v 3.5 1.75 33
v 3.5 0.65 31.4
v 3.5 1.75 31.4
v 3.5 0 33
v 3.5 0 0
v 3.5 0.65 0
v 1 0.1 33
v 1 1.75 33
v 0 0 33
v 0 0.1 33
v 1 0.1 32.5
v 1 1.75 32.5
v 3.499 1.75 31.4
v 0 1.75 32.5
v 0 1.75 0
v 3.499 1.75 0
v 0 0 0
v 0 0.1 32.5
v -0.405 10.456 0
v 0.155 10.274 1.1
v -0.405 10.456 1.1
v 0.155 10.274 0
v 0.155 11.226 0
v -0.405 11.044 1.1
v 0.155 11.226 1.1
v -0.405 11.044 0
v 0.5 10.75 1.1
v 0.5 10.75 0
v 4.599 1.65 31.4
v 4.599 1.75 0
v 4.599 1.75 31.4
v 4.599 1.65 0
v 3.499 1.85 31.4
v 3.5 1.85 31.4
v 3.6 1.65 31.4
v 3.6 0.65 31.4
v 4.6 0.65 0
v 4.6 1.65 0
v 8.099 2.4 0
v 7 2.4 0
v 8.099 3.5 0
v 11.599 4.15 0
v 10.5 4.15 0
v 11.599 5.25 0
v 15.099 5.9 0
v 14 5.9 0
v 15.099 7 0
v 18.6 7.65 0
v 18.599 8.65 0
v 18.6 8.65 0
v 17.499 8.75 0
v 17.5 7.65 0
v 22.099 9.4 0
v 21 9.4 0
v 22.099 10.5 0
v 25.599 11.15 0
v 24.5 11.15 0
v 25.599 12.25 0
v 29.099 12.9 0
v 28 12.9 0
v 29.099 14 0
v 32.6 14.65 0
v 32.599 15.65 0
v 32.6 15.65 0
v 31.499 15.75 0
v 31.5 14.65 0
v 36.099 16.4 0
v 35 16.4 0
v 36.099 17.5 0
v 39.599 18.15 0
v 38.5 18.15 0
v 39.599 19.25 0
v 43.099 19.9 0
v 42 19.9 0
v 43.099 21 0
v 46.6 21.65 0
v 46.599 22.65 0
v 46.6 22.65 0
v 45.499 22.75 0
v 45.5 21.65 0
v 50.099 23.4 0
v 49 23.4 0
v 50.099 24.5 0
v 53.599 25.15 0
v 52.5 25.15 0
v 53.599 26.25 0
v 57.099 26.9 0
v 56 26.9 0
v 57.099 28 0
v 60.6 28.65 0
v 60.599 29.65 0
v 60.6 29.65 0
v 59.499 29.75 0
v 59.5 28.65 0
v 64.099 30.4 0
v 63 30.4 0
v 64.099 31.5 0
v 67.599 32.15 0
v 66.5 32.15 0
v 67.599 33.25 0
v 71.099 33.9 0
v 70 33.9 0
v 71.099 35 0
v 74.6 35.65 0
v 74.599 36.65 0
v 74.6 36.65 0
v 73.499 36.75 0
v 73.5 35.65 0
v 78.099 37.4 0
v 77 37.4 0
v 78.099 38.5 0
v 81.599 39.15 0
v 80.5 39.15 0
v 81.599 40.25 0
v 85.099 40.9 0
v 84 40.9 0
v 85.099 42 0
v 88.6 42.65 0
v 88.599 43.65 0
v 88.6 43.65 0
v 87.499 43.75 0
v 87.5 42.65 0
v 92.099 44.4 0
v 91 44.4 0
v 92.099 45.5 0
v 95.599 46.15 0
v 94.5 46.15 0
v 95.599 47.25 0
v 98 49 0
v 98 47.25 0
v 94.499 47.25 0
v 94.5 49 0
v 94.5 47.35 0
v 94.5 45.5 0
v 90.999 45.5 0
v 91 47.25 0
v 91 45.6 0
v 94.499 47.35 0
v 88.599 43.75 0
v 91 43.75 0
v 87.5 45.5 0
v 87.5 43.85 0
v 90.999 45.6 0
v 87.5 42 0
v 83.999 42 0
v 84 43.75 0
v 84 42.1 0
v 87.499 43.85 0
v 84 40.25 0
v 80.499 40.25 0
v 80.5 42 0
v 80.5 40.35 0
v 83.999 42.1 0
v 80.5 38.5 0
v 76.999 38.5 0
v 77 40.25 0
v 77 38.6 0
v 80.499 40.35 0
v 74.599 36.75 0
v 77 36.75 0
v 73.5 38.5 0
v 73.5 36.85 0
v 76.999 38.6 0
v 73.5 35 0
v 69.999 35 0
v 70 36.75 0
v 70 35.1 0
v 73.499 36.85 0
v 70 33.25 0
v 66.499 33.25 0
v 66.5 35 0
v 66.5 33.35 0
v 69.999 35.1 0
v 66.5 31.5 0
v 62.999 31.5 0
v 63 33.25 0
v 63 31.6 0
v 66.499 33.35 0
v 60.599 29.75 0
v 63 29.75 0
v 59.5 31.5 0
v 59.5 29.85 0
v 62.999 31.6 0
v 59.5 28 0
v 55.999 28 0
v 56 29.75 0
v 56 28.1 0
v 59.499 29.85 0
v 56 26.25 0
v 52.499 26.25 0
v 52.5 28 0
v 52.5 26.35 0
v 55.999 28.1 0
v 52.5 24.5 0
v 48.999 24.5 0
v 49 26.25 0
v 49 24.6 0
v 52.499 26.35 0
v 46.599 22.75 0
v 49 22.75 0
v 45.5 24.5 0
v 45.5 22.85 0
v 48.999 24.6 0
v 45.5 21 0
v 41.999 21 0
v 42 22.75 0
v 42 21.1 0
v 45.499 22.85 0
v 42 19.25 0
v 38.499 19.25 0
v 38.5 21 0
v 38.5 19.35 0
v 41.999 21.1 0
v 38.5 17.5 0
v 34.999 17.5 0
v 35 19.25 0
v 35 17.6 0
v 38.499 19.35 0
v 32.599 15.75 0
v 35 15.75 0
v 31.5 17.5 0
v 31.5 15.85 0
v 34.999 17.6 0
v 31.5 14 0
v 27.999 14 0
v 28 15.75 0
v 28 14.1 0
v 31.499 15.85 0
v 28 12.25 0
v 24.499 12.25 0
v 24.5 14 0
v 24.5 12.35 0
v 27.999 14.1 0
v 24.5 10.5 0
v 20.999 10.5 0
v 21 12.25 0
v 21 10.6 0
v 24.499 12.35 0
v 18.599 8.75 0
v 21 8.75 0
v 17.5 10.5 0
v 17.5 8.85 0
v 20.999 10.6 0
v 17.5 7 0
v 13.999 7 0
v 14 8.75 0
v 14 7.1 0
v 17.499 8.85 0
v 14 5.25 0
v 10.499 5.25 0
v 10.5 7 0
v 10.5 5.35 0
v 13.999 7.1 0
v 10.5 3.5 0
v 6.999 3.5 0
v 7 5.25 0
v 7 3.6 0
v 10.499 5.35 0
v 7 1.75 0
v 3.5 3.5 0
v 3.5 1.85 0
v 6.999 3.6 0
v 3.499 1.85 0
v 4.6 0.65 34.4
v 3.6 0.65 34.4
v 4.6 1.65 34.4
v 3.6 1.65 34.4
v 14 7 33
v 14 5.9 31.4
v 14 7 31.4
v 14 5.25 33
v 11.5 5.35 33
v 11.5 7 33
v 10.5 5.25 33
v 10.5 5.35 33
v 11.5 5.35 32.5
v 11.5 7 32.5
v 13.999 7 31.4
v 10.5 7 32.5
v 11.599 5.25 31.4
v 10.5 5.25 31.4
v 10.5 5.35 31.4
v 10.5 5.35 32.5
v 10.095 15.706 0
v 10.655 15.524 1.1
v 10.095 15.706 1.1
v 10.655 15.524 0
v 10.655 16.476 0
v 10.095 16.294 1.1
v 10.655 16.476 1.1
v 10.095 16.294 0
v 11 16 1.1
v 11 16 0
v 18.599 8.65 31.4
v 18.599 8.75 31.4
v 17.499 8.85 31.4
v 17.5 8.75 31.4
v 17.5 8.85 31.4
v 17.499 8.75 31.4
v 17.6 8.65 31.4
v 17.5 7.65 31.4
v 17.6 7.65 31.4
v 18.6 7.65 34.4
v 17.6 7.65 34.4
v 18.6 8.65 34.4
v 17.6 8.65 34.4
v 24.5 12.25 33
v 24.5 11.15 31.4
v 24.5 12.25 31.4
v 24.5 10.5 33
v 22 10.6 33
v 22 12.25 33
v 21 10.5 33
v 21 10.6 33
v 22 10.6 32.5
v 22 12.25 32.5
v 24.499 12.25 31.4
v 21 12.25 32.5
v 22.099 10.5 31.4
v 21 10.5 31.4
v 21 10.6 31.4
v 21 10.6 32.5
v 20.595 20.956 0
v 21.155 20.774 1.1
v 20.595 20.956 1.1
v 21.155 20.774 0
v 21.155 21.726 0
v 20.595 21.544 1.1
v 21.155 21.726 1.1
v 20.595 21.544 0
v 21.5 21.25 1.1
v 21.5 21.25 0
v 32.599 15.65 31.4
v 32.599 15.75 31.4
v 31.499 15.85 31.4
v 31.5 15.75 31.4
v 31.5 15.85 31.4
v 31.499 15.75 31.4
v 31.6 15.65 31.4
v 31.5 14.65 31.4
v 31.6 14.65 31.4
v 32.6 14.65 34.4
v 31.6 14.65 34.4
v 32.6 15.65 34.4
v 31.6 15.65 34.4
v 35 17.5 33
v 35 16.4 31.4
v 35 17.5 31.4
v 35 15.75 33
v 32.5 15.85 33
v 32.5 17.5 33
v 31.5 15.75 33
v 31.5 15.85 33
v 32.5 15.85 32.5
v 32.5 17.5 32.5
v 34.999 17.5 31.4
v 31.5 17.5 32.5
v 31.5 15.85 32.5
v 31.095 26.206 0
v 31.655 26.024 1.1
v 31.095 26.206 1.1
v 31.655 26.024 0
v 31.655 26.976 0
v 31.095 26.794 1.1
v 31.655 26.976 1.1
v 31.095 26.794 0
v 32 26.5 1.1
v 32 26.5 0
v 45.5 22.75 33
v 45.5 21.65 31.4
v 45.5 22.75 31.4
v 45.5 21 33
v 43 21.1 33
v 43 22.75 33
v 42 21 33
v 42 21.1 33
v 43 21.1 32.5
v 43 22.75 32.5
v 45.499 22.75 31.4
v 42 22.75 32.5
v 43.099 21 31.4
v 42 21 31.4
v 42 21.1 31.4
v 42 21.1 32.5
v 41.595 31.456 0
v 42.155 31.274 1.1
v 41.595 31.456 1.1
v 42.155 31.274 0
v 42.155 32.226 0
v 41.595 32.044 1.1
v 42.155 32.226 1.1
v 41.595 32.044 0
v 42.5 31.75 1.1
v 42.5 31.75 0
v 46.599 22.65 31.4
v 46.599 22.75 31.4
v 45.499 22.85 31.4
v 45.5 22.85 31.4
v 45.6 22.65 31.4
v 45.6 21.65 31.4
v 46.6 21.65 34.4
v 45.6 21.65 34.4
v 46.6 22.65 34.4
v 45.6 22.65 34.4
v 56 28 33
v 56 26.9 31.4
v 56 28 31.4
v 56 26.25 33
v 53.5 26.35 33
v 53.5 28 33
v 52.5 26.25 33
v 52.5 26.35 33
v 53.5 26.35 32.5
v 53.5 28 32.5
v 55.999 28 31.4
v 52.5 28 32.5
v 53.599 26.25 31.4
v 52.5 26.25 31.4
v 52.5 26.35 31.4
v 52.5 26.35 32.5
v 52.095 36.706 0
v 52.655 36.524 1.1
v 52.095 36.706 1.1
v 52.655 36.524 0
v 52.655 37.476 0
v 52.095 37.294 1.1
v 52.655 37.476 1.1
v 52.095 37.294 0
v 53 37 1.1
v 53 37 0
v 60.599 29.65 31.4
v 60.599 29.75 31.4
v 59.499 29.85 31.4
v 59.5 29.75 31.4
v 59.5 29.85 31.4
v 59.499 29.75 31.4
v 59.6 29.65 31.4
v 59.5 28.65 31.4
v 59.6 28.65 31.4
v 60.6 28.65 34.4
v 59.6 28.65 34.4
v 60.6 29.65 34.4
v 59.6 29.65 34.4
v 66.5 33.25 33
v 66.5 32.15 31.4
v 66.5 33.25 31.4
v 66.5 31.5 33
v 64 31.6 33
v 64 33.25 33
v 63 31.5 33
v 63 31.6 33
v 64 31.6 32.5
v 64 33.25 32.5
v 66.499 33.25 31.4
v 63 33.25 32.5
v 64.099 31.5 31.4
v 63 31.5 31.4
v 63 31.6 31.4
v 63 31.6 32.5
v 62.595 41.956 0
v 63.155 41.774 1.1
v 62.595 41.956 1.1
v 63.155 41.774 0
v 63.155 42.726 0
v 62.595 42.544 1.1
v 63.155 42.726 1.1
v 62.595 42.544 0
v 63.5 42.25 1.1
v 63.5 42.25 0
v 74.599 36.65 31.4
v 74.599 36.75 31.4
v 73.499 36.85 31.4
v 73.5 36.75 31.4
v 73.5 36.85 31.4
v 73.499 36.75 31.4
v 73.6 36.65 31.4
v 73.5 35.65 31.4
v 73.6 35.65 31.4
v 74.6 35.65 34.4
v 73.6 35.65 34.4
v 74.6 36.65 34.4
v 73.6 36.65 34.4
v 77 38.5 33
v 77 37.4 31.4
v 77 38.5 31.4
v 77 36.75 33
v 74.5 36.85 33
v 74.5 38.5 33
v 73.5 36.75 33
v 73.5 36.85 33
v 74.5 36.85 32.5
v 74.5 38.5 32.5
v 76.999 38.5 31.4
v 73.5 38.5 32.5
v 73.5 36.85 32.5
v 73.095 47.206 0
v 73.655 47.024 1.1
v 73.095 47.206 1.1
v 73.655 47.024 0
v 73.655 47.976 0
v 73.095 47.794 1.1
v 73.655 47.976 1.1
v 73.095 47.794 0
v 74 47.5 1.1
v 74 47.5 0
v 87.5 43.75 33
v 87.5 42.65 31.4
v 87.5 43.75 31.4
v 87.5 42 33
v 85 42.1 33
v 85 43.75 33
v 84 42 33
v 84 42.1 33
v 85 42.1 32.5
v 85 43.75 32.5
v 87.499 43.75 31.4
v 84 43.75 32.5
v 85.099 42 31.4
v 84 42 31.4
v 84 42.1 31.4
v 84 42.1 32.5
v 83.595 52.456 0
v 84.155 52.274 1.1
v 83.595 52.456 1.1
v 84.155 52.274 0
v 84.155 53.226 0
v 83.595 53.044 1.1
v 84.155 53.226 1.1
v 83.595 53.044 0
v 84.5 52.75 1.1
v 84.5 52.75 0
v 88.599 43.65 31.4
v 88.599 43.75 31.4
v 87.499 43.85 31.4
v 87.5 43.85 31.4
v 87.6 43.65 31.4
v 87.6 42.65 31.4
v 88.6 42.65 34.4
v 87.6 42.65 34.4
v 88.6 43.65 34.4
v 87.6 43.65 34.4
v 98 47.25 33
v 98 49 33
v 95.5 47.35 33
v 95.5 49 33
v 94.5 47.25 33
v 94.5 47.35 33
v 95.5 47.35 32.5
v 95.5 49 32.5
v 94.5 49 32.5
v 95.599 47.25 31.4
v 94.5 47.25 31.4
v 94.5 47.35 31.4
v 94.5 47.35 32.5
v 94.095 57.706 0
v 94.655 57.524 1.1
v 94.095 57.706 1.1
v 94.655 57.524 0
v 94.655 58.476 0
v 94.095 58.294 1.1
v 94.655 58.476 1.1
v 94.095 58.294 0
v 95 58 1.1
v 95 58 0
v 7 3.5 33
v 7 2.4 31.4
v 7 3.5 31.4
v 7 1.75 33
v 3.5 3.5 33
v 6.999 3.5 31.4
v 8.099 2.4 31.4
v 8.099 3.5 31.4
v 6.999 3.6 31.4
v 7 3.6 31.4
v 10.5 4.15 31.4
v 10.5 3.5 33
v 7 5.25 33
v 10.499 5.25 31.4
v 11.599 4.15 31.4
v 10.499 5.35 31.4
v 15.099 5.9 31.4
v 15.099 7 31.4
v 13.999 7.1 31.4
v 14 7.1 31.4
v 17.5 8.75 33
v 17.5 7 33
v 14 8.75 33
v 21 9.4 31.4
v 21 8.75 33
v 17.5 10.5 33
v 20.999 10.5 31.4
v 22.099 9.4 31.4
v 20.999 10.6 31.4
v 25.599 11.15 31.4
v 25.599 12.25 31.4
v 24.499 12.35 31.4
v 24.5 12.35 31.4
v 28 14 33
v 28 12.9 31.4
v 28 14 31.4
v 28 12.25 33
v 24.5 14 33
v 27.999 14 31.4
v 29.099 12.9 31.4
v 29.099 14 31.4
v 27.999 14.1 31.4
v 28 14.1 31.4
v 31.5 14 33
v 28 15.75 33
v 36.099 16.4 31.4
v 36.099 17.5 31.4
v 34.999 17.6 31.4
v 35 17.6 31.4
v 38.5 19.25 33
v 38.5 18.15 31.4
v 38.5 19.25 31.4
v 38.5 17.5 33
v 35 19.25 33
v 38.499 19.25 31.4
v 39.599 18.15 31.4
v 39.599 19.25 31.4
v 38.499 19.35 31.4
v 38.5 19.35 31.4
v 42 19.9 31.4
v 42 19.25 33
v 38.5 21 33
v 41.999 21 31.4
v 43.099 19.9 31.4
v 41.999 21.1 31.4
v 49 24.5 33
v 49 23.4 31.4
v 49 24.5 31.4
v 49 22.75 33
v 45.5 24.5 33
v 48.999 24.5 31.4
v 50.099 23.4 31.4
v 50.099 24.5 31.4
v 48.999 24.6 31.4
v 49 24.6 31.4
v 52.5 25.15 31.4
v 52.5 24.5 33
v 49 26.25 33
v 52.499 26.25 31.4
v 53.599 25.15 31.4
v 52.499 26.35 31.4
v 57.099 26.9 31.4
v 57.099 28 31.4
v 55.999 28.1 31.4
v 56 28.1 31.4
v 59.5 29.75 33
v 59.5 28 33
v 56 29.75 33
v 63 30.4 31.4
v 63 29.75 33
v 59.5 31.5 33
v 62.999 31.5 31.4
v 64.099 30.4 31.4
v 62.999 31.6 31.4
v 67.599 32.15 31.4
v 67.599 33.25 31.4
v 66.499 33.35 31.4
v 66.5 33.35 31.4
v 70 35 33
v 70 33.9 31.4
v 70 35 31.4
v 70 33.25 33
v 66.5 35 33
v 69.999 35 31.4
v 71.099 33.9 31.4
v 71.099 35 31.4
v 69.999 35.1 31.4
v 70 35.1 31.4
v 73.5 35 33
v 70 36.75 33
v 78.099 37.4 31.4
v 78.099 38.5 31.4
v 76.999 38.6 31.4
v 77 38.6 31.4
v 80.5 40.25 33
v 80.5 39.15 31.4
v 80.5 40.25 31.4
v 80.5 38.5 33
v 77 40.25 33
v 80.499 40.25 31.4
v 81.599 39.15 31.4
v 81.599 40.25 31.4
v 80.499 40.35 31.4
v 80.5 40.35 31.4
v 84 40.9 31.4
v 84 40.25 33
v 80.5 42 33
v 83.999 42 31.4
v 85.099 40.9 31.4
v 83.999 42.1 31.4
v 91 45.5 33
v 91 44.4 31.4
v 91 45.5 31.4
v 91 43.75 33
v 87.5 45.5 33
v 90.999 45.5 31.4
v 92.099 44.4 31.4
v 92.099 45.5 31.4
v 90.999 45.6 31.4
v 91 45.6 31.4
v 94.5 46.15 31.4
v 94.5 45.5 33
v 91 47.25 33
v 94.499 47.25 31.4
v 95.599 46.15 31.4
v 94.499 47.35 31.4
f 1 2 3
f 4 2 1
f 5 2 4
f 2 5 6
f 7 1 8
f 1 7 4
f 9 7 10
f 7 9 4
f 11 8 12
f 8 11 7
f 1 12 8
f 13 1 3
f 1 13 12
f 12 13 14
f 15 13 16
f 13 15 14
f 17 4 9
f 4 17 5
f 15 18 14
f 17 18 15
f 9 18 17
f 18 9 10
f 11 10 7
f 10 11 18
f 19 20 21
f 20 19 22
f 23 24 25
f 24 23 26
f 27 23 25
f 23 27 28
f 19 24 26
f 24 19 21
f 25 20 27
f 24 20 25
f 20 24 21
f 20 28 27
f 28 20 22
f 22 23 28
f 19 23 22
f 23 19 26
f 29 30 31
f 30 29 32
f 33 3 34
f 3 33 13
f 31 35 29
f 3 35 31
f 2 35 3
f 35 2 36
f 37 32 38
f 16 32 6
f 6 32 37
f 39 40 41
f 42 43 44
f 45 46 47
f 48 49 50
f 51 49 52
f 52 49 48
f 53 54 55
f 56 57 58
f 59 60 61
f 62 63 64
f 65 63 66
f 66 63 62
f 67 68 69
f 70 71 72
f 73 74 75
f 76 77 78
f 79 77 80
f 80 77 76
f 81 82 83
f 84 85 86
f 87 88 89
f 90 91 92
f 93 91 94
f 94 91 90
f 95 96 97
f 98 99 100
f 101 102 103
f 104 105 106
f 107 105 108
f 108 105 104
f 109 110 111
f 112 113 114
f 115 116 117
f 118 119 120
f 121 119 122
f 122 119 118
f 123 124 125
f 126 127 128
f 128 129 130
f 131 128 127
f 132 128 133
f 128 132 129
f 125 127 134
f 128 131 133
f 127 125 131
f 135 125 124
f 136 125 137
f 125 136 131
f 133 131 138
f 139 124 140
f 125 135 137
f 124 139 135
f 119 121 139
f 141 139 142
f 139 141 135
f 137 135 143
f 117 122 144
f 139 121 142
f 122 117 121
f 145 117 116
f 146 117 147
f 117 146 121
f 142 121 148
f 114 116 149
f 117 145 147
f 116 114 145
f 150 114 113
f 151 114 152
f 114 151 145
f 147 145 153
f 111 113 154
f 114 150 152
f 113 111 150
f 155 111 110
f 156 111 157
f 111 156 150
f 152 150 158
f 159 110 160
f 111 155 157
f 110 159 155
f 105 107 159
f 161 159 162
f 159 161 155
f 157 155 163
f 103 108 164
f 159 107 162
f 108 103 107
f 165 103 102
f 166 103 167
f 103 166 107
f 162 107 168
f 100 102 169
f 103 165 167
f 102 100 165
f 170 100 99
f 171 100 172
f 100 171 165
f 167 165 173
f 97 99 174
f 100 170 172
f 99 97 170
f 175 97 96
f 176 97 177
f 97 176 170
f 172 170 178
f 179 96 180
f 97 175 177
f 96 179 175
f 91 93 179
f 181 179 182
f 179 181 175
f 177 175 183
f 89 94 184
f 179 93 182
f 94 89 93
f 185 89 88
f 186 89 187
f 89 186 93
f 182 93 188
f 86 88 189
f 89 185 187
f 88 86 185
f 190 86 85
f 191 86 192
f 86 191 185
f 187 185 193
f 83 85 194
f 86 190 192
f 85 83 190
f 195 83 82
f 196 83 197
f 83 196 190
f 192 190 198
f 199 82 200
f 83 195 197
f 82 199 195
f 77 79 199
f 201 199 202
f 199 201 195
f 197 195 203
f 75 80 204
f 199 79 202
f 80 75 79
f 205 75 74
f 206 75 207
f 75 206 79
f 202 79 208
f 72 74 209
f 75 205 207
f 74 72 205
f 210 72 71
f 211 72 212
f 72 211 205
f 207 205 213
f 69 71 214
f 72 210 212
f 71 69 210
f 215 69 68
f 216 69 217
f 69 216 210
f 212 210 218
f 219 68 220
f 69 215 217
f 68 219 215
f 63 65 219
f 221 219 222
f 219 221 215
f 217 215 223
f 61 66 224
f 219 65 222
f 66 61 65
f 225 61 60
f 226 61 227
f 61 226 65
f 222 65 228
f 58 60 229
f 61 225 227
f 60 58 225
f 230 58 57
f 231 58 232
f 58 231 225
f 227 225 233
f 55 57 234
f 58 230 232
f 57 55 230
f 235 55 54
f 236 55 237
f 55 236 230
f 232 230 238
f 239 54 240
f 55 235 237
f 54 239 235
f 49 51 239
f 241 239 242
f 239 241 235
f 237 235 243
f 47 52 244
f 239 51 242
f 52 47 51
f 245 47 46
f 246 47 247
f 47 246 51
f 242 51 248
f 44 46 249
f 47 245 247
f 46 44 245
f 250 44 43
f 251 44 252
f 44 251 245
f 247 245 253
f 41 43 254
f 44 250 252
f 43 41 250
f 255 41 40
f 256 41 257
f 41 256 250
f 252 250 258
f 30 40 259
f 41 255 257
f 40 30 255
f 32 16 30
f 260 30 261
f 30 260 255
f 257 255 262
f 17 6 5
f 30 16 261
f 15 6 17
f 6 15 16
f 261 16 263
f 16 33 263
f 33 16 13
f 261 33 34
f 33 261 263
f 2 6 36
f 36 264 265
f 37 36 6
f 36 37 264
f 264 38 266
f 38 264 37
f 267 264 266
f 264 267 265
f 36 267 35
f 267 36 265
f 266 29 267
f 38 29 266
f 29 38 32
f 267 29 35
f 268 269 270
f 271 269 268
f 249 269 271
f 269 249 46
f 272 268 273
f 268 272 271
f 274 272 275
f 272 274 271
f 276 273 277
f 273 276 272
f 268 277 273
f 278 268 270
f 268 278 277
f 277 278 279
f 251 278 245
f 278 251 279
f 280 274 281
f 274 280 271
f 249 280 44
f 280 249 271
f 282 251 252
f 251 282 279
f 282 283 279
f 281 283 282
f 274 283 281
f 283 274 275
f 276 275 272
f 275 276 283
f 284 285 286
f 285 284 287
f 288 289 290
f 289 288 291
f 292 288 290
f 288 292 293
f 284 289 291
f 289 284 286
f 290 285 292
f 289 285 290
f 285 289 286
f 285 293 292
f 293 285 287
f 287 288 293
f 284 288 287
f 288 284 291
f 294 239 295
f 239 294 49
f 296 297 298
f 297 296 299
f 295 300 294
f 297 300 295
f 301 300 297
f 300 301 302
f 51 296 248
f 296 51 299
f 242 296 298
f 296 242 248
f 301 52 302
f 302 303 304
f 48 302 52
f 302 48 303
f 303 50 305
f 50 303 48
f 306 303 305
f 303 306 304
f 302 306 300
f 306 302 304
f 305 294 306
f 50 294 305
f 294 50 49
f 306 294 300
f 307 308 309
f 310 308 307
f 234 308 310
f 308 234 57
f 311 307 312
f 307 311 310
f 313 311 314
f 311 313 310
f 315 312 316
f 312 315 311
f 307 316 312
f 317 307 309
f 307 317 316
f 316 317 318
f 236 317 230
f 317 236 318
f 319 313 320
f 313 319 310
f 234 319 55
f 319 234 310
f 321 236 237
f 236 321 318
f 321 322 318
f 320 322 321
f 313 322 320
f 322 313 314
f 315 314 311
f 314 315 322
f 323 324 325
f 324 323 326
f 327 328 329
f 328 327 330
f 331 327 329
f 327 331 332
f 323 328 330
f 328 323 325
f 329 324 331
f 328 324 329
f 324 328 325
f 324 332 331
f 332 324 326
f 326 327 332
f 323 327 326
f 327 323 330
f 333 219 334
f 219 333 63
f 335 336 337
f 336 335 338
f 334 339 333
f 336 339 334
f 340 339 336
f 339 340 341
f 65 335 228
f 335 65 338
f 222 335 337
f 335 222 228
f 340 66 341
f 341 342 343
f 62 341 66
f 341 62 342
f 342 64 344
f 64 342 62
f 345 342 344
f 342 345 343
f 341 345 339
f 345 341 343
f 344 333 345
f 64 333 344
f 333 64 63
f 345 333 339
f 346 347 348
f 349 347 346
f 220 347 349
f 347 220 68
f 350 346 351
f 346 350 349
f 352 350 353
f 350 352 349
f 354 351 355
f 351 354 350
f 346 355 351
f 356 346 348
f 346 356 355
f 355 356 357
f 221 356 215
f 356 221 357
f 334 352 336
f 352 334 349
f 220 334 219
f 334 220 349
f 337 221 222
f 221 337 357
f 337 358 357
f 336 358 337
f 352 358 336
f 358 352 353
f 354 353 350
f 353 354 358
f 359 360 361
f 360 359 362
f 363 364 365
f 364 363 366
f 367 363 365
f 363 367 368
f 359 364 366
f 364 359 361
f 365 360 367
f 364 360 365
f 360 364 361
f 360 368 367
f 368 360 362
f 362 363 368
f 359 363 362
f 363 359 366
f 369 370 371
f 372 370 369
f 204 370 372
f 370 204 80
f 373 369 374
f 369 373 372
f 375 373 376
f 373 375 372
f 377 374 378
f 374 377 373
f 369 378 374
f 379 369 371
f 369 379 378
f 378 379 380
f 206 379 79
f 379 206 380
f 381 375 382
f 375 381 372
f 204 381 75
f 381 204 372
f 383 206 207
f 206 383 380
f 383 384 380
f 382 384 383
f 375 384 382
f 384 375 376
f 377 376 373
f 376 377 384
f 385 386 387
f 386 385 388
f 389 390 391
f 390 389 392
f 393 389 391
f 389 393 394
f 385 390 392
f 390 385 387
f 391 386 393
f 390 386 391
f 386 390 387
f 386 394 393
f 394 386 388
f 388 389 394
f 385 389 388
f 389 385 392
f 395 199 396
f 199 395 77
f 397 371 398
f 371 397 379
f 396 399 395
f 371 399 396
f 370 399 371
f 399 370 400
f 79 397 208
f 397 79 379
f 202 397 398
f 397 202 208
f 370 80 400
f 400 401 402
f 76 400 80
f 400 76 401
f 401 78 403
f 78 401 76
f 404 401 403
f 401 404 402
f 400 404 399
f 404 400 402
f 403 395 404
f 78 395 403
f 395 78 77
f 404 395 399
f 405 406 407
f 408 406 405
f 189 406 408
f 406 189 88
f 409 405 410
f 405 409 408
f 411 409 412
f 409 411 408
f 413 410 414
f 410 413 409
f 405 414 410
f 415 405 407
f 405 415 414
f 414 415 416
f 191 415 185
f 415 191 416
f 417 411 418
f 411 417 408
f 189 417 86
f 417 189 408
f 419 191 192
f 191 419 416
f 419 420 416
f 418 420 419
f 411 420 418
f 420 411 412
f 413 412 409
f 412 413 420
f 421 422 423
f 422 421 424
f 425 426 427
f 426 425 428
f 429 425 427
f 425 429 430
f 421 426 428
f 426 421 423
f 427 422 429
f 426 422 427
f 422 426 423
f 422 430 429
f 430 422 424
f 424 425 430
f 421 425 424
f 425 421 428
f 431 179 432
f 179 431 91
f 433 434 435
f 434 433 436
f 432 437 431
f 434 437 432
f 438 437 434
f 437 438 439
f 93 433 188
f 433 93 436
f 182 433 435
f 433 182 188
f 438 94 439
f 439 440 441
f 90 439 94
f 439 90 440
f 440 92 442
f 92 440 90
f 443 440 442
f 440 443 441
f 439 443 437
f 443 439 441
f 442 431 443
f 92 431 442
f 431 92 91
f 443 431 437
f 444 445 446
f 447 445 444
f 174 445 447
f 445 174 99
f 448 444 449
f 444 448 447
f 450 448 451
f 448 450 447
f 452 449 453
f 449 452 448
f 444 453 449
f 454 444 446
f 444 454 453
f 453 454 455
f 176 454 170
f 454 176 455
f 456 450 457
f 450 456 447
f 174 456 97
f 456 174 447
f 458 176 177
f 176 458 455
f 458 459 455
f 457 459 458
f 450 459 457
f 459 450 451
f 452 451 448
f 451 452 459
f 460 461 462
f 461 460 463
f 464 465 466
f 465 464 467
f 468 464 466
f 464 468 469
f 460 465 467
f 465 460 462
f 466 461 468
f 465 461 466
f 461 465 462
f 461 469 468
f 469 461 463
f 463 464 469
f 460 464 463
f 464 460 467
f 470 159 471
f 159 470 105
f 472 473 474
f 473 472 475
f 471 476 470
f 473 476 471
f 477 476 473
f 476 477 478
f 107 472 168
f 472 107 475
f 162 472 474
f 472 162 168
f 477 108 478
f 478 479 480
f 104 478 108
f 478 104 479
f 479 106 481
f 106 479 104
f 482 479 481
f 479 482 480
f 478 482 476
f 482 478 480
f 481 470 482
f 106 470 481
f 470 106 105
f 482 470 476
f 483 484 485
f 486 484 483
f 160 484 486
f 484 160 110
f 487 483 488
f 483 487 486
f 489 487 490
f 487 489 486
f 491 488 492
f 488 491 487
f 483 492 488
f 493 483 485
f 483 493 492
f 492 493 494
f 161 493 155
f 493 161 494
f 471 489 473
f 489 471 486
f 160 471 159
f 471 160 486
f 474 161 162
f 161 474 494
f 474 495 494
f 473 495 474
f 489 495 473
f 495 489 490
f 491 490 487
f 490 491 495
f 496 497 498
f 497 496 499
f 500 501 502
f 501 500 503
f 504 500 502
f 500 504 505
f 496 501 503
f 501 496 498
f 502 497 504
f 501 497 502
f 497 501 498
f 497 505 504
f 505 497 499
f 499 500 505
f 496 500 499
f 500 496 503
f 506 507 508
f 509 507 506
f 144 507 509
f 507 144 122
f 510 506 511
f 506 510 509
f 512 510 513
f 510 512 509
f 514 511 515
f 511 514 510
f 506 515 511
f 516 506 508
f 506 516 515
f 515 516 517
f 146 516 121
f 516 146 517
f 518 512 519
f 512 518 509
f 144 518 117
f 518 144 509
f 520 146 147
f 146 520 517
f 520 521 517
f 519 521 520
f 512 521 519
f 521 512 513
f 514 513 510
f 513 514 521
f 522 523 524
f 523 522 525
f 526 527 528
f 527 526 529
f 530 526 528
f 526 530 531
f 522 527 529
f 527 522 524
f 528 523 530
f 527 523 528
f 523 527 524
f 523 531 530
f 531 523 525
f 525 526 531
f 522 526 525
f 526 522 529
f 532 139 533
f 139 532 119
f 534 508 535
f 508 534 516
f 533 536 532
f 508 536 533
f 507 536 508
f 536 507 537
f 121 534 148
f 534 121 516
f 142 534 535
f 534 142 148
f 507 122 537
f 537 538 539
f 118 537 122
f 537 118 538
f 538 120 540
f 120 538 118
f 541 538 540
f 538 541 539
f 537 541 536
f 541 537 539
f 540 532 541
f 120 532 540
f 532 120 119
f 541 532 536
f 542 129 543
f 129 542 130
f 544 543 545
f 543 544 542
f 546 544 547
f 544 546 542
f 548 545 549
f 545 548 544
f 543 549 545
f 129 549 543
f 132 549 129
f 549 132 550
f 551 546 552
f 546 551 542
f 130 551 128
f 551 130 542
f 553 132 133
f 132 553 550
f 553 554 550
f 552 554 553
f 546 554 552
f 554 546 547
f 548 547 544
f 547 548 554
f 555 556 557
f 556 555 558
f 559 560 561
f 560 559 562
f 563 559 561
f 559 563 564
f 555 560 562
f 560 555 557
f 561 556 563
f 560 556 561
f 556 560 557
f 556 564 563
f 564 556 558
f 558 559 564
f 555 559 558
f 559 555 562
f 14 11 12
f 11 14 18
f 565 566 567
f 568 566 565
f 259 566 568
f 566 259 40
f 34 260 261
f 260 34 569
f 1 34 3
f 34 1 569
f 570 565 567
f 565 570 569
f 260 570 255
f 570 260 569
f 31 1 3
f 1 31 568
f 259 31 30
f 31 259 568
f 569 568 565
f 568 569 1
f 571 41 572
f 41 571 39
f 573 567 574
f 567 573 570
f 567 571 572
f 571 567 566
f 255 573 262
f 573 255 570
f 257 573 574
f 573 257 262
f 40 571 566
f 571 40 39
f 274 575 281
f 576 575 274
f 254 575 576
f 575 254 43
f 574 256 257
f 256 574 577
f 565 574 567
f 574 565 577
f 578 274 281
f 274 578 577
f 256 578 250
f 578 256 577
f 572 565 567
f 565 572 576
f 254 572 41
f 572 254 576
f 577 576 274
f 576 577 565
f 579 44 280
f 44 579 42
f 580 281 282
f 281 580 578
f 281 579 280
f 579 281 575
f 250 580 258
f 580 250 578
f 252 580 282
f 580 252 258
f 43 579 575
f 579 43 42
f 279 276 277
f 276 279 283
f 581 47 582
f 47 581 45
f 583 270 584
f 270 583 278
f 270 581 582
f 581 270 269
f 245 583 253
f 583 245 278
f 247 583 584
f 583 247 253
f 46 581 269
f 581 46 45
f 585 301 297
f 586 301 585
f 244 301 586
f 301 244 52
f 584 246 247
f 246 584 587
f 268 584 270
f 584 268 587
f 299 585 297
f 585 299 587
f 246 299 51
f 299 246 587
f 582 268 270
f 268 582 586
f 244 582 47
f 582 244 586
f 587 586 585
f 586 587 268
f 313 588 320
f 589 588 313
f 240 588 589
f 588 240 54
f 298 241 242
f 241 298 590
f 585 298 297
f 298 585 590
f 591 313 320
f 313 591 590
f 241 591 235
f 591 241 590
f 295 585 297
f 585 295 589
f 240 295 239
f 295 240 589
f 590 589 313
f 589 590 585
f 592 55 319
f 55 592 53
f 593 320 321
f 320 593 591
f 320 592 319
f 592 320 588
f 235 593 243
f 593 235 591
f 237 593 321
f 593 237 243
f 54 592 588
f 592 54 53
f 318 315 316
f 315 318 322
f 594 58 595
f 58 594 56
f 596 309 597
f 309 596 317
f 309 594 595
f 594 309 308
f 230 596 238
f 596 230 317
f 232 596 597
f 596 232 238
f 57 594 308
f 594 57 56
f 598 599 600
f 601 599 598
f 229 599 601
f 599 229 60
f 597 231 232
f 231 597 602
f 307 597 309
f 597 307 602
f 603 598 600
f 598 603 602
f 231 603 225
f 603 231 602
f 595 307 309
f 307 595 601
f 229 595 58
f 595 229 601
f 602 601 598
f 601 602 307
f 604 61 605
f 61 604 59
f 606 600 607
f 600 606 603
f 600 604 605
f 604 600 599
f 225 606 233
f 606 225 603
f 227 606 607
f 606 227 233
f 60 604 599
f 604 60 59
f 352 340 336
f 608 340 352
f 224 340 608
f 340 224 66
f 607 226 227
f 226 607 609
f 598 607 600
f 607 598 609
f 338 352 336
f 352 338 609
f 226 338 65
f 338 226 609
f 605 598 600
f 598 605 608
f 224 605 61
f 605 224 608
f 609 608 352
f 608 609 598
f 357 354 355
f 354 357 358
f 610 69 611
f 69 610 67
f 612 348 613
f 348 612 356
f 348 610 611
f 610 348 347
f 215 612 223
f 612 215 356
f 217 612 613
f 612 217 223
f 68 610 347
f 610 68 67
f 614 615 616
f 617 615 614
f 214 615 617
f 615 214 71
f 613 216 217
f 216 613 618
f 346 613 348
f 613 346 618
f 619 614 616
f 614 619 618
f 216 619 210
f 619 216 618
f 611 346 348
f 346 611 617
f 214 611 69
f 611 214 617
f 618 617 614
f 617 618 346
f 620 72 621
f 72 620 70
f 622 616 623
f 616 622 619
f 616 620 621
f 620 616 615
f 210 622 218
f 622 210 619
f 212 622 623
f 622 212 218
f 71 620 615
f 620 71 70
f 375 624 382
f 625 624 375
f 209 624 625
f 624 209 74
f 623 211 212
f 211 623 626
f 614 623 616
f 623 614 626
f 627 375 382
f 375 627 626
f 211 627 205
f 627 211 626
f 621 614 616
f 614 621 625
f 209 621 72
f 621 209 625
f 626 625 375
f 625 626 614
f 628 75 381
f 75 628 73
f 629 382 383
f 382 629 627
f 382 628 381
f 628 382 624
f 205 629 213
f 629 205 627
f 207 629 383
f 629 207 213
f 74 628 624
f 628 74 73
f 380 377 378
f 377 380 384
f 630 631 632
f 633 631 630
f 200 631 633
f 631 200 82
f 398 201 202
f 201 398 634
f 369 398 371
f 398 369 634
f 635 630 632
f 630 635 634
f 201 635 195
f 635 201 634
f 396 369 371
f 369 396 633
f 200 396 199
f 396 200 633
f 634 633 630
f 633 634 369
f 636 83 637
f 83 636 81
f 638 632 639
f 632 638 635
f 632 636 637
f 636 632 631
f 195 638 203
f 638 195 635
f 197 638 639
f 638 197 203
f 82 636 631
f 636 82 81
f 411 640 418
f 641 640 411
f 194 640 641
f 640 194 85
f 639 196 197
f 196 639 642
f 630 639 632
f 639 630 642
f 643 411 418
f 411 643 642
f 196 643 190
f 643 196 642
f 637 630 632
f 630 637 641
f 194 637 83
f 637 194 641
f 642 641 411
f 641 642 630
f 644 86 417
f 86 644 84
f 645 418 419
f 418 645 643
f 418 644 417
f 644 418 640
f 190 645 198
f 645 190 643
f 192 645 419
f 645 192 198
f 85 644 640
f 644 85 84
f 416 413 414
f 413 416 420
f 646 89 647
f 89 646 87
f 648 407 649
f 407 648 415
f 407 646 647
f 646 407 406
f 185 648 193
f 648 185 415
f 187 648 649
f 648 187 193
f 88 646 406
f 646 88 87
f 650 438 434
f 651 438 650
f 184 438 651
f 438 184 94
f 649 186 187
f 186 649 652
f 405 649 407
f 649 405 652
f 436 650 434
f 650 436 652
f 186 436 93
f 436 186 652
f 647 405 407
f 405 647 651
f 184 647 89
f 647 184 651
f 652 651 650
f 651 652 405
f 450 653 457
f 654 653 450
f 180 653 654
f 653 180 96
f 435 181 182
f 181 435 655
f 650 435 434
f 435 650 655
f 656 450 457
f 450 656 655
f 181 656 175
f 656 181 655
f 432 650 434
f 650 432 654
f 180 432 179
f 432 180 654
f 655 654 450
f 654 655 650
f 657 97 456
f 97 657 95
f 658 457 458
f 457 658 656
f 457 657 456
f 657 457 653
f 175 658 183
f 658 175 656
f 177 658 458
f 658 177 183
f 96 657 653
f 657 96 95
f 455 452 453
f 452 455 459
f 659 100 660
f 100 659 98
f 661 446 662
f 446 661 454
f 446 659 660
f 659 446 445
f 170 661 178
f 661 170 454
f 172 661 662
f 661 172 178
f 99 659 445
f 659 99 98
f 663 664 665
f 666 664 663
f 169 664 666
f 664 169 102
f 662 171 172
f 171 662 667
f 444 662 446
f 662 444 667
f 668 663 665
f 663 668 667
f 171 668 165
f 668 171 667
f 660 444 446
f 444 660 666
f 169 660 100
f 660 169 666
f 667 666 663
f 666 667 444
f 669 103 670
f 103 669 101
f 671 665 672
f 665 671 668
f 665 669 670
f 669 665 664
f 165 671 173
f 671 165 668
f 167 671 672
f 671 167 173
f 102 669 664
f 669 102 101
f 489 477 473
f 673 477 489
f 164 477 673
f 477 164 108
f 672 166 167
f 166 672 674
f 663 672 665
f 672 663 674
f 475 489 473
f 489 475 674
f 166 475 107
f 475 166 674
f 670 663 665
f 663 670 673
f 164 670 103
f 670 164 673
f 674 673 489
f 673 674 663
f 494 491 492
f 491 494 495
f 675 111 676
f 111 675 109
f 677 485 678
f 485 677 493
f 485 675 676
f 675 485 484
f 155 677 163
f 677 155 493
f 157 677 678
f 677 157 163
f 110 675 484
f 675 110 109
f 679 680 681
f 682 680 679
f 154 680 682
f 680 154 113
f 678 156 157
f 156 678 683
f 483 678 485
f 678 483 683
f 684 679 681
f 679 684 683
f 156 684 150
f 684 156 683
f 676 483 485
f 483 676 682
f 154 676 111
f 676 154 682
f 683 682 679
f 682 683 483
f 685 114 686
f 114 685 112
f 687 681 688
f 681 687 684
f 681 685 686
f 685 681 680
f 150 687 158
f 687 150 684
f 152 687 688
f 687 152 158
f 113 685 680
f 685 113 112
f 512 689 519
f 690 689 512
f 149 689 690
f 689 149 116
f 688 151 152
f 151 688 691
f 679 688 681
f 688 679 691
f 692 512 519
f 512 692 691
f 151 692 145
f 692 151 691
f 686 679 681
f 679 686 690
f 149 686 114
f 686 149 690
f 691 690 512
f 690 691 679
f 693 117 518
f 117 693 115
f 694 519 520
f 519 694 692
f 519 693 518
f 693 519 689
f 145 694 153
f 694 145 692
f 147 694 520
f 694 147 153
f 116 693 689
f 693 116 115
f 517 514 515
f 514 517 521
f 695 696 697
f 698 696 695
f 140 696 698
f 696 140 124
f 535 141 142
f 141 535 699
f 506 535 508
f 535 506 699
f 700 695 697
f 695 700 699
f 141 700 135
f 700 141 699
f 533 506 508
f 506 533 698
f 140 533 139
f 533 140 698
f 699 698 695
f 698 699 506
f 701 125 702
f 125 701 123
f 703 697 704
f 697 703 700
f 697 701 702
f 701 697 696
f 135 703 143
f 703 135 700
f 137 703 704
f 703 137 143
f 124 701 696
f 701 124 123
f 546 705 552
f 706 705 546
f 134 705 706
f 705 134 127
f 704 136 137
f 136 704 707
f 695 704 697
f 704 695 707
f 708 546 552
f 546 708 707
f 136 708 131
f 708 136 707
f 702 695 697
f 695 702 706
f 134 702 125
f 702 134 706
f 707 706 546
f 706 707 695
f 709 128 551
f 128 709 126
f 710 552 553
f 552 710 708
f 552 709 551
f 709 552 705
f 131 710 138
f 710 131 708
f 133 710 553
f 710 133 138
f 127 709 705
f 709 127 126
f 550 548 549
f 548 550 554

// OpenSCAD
/// @file fb_mod_LHstairs.scad
///
/// @brief footbridbge mod LH stairs
///
/// @author © Dave Harris 2022
/// 


module fb_mod_LHstairs(
          steps
        , rise
        , tread
        , width
       )
{
  for( step = [ 0 : 1 : steps ] ) 
  {
    x = step * tread;
    y = step * rise;
      
    //echo("stairsLH x,y=",x,y);
      
    translate( // step
      [ x
      , y
      , 0 ]
    ) cube(
        [ tread
        , rise
        , width -0.5  ]
      ); 
      
    if(step % 3 == 0) // post hole
    {
        translate(
          [ x +1
          , y
          , width -0.6 ]
        ) cube(
            [ tread -1
            , rise
            , 0.6  ]
          );
        
      translate( // filler
        [ x
        , y
        , width -0.6 ]
      ) cube(
          [ 1.1
          , 0.1
          , 0.6 ]
        ); 
        
        translate( // side rail
          [ x
          , y +10.75
          , 0  ]
        ) cylinder(
              h = 1.1
            , r = 0.5
          );
    }
    else // no post hole
    {
      translate(
        [ x
        , y
        , width -0.6 ]
      ) cube(
          [ tread
          , rise
          , 0.6 ]
        ); 

    }
    
    if(step < steps) // no tab at top
    {
      translate(
        [ x +tread -0.1
        , y + rise -1
        , 0 ]
      ) cube(
          [ 1
          , 0
          , width -1.6 ]
        );
        
      translate(
        [ x + tread -0.001 
        , y + rise -1.1 
        , 0 ]
      ) cube(
          [ 1.1
          , 1.2
          , width - 1.6 ]
        );
      
      if(step % 4 == 0) // tab
      {
        translate(
          [ x +tread +0.1
          , y + rise -1.1
          , 0  ]
        ) cube(
            [ 1
            , 1
            , width +1.4  ]
          );
      }
    } // end if
  } // end for
}


// local test

fb_mod_LHstairs(
    steps = 27
  , rise  = 1.75
  , tread = 3.5
  , width = 33
);


// eof
